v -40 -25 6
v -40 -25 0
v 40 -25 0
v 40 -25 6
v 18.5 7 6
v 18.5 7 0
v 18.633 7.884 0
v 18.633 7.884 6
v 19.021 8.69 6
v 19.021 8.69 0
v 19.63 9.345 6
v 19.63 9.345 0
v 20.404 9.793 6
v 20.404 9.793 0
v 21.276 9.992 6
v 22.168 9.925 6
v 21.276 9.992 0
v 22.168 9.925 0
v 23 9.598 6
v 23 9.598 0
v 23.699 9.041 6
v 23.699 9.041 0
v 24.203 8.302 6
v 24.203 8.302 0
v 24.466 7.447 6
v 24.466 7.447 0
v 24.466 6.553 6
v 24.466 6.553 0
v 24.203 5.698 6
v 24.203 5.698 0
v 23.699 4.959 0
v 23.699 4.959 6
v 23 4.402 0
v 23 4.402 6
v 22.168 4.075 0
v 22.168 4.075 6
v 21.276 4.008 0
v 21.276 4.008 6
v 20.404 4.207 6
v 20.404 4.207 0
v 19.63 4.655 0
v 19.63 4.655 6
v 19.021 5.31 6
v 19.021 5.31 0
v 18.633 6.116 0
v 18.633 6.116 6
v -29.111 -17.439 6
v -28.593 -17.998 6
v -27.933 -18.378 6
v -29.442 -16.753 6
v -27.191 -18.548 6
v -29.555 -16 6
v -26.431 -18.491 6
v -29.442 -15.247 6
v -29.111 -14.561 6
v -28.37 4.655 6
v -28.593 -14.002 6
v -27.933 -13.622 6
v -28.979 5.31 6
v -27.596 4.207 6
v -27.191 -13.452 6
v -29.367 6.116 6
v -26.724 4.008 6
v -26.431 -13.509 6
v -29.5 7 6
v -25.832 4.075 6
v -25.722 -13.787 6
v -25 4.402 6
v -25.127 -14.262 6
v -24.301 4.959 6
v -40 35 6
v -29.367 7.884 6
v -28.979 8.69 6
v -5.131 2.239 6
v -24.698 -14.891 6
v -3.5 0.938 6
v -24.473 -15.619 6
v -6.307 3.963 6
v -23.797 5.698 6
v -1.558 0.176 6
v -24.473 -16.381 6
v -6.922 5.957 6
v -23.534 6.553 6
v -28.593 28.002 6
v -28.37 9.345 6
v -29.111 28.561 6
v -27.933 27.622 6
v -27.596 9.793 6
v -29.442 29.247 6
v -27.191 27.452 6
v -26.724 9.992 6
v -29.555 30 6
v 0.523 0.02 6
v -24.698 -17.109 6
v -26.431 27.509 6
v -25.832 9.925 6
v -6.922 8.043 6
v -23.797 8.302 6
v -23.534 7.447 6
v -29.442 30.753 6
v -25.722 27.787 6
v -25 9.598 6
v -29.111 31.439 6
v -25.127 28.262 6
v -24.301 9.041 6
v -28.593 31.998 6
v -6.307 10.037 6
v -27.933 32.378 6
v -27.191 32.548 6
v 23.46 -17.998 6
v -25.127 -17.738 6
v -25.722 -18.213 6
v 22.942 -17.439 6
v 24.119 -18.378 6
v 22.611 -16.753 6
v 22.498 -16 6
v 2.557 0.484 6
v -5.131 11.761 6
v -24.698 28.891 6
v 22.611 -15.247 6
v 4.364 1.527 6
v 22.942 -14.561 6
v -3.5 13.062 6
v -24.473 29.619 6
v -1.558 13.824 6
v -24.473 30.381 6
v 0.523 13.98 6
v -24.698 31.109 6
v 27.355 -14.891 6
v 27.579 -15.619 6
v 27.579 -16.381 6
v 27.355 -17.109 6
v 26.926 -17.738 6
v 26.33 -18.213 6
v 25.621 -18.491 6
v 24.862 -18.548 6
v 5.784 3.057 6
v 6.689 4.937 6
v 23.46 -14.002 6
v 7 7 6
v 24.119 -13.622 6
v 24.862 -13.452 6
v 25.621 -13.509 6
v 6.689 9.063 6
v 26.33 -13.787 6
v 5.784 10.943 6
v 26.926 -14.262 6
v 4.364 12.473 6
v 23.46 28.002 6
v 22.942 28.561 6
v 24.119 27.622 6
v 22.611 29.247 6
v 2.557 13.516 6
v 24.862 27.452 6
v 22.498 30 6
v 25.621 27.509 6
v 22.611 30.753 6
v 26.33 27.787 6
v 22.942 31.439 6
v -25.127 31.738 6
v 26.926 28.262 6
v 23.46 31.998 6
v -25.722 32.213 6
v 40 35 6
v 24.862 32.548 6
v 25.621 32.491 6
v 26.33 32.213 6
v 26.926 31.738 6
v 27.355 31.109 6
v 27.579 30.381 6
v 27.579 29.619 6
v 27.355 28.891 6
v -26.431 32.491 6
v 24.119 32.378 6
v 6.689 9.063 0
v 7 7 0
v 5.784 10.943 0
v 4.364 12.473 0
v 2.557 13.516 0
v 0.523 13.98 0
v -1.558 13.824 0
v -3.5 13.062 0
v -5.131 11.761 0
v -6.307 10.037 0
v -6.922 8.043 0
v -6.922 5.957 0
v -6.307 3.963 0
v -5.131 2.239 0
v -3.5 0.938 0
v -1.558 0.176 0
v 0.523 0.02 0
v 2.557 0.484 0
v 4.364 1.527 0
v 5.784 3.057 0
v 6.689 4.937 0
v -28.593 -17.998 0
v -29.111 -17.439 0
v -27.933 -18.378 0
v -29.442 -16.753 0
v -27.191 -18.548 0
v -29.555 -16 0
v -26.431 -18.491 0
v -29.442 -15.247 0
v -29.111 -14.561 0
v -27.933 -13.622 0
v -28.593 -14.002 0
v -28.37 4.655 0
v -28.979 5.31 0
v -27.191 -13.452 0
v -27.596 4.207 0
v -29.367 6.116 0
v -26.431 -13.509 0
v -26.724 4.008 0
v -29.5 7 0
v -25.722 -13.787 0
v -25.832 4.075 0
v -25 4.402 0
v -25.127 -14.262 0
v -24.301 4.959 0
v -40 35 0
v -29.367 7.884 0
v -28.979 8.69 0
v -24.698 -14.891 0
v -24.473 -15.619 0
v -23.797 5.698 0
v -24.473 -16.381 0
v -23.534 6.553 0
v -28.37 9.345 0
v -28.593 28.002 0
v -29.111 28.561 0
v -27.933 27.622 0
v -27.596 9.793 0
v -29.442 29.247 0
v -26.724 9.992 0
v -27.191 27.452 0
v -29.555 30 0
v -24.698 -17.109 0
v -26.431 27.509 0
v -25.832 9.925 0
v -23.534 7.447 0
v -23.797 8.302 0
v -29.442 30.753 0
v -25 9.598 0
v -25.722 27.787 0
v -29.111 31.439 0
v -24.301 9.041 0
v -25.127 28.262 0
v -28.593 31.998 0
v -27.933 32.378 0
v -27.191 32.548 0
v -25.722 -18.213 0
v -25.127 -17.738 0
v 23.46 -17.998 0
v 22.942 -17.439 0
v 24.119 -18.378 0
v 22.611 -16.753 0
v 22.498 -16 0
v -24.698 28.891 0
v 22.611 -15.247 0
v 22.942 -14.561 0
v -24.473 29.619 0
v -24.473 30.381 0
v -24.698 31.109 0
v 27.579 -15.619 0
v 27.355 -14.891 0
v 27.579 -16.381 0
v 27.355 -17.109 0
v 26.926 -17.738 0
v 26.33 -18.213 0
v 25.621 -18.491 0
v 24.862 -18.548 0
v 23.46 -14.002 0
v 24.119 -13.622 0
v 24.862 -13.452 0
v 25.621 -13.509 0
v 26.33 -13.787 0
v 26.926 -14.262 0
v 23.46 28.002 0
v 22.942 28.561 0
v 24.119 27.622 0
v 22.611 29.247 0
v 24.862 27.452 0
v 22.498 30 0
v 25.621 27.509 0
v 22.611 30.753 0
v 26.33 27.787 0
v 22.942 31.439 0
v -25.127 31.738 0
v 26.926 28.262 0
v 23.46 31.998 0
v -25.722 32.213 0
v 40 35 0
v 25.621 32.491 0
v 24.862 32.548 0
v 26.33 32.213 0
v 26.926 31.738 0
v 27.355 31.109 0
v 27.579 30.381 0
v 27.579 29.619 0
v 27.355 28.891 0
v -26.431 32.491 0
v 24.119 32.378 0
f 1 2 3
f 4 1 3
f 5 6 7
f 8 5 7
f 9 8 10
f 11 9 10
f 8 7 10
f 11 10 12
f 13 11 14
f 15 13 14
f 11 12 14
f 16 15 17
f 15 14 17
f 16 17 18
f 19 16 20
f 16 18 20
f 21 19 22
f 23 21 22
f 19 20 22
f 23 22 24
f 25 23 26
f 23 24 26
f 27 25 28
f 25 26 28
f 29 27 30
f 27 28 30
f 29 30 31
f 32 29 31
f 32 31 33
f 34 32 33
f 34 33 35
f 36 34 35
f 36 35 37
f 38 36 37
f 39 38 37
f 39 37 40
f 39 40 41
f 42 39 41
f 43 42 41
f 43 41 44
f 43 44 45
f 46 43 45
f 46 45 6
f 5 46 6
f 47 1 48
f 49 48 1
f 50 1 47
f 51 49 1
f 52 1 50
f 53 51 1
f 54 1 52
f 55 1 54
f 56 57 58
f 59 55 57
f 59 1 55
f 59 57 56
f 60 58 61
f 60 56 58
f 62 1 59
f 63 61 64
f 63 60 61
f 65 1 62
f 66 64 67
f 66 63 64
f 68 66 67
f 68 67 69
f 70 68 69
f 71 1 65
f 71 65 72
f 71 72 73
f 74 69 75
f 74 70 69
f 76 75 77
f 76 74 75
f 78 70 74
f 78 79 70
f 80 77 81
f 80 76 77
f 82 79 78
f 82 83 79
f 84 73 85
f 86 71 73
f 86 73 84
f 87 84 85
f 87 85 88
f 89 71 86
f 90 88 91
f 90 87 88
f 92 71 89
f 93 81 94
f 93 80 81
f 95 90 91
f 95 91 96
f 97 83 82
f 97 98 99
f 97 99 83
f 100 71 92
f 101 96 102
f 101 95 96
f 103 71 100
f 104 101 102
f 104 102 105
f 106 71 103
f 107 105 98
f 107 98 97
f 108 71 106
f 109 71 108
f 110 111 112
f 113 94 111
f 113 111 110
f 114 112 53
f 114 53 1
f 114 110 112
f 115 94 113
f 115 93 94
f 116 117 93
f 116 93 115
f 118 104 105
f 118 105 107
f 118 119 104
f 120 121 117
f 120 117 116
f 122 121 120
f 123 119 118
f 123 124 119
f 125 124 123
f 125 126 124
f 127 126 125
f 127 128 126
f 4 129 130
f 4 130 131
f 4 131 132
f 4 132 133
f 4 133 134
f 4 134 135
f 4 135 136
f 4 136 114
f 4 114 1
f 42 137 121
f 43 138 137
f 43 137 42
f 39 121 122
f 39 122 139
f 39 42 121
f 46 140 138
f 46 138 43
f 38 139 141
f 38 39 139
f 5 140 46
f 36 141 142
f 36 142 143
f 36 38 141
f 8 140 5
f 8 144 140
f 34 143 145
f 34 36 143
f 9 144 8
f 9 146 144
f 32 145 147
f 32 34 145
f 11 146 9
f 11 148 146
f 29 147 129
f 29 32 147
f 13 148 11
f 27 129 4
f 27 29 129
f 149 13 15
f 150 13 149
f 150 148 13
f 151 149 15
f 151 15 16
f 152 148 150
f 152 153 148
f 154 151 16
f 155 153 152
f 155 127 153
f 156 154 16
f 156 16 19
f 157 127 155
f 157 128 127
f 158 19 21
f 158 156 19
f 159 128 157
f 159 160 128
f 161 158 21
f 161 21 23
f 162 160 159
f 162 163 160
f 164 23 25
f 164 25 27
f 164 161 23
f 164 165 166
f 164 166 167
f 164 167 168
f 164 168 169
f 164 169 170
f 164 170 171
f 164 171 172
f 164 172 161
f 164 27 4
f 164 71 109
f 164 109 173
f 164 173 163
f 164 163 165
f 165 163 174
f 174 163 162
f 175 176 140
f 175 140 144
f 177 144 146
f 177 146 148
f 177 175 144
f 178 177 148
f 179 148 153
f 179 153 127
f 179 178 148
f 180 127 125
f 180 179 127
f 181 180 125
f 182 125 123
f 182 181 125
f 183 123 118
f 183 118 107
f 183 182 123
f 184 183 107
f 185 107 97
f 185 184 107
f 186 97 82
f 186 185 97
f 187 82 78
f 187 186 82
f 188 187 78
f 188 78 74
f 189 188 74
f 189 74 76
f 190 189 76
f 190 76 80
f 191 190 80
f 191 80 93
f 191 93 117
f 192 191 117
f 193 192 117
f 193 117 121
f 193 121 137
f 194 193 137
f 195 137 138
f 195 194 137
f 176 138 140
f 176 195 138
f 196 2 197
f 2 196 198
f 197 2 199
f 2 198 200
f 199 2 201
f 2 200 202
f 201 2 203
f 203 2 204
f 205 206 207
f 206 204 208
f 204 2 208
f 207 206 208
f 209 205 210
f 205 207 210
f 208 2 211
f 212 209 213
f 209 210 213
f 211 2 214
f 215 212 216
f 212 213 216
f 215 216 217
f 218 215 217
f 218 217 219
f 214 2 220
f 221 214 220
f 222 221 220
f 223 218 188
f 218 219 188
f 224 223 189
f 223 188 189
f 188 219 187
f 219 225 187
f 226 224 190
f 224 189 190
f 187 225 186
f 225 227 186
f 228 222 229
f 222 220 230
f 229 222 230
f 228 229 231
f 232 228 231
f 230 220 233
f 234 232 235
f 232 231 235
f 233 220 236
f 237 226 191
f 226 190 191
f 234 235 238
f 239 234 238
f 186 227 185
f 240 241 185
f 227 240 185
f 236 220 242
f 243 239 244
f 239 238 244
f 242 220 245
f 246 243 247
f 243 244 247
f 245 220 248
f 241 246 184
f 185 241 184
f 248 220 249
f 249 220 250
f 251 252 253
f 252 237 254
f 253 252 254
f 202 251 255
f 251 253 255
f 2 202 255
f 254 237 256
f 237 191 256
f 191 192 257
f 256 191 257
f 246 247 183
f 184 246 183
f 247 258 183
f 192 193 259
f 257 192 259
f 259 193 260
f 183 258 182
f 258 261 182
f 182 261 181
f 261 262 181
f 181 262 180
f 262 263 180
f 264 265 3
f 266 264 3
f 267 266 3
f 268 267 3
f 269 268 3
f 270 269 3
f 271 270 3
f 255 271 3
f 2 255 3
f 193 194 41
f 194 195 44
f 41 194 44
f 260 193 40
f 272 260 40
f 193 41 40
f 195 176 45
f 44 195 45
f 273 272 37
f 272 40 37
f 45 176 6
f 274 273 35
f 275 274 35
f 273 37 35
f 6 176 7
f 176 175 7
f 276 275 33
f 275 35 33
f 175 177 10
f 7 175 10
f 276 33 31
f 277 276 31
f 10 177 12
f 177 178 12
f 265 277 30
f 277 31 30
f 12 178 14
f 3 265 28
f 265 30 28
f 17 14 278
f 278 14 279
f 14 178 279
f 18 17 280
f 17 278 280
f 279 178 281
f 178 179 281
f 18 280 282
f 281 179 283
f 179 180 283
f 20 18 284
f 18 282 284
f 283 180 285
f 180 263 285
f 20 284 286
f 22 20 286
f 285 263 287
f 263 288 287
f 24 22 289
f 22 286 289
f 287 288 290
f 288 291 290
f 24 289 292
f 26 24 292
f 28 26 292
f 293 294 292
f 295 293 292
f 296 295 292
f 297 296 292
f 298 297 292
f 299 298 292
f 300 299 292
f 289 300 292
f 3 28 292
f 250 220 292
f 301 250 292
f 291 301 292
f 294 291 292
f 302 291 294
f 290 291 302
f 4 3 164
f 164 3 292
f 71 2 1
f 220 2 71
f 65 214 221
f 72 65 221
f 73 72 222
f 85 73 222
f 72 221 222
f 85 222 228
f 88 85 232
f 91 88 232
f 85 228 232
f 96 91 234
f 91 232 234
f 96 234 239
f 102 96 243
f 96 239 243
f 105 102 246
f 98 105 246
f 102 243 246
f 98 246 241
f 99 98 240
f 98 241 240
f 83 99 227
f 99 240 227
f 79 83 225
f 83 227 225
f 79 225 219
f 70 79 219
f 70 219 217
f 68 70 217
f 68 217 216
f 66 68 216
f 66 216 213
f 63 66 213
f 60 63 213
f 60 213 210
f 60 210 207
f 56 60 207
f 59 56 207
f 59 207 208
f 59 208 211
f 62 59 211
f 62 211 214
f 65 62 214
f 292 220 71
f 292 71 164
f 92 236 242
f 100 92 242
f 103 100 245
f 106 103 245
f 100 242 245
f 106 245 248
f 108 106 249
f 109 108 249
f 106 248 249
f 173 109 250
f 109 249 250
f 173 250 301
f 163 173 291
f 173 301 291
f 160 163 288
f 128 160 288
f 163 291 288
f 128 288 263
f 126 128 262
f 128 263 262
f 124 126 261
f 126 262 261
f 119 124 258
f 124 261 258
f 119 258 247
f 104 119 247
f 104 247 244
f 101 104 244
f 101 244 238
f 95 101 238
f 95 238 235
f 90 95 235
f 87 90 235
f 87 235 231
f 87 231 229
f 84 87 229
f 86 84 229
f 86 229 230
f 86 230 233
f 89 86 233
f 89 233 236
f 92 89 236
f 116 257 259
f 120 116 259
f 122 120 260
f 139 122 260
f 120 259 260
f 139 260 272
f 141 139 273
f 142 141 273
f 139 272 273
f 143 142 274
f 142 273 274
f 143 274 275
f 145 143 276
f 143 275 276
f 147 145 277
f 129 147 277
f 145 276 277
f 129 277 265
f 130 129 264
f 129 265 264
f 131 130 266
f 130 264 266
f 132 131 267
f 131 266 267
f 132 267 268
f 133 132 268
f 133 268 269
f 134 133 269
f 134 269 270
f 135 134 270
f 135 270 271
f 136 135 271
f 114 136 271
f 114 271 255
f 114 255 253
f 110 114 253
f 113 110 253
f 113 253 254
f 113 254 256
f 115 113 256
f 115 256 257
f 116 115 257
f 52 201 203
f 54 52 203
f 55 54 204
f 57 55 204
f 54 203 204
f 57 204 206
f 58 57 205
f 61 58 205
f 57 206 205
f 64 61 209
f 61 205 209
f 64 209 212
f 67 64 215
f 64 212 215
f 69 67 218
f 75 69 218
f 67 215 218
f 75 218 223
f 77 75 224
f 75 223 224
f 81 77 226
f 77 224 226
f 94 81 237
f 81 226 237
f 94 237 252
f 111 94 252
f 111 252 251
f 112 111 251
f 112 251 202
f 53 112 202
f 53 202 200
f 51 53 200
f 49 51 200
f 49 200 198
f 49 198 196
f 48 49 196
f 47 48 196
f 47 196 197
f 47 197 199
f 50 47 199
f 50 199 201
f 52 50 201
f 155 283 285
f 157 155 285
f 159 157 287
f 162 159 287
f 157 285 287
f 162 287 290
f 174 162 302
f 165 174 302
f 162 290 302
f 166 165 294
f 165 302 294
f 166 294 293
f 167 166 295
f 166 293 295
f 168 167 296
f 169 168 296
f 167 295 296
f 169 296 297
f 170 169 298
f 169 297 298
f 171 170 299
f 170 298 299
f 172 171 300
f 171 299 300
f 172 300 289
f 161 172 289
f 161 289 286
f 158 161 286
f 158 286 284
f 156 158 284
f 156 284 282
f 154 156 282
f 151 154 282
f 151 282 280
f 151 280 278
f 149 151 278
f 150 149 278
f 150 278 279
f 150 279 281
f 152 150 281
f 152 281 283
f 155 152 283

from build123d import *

# Parameters (mm, degrees)
SKETCH_1_W          = 80
SKETCH_1_H          = 60
SKETCH_1_R          = 7
EXTRUDE_1_DEPTH     = 6
SKETCH_2_R          = 3
SKETCH_2_R_2        = 2.555087711
CUT_EXTRUDE_1_DEPTH = 10


with BuildPart() as part:
    # 草图1 → 凸台-拉伸1 (new body)
    with BuildSketch(Plane.XY):
        with Locations((0, 5)):
            Rectangle(SKETCH_1_W, SKETCH_1_H)
        with Locations((0, 7)):
            Circle(SKETCH_1_R, mode=Mode.SUBTRACT)
    extrude(amount=EXTRUDE_1_DEPTH)

    # 草图2 → 切除-拉伸1 (cut)
    with BuildSketch(Plane(origin=(0, 0, 0), x_dir=(-1, 0, 0), z_dir=(0, 0, -1))):
        with Locations((-21.5, 7)):
            Circle(SKETCH_2_R)
        with Locations((26.5, 7)):
            Circle(SKETCH_2_R)
        with Locations((27, 30)):
            Circle(SKETCH_2_R_2)
        with Locations((27, -16)):
            Circle(SKETCH_2_R_2)
        with Locations((-25.052626778, -16)):
            Circle(SKETCH_2_R_2)
        with Locations((-25.052626778, 30)):
            Circle(SKETCH_2_R_2)
    extrude(amount=-CUT_EXTRUDE_1_DEPTH, mode=Mode.SUBTRACT)


solid = part.part
